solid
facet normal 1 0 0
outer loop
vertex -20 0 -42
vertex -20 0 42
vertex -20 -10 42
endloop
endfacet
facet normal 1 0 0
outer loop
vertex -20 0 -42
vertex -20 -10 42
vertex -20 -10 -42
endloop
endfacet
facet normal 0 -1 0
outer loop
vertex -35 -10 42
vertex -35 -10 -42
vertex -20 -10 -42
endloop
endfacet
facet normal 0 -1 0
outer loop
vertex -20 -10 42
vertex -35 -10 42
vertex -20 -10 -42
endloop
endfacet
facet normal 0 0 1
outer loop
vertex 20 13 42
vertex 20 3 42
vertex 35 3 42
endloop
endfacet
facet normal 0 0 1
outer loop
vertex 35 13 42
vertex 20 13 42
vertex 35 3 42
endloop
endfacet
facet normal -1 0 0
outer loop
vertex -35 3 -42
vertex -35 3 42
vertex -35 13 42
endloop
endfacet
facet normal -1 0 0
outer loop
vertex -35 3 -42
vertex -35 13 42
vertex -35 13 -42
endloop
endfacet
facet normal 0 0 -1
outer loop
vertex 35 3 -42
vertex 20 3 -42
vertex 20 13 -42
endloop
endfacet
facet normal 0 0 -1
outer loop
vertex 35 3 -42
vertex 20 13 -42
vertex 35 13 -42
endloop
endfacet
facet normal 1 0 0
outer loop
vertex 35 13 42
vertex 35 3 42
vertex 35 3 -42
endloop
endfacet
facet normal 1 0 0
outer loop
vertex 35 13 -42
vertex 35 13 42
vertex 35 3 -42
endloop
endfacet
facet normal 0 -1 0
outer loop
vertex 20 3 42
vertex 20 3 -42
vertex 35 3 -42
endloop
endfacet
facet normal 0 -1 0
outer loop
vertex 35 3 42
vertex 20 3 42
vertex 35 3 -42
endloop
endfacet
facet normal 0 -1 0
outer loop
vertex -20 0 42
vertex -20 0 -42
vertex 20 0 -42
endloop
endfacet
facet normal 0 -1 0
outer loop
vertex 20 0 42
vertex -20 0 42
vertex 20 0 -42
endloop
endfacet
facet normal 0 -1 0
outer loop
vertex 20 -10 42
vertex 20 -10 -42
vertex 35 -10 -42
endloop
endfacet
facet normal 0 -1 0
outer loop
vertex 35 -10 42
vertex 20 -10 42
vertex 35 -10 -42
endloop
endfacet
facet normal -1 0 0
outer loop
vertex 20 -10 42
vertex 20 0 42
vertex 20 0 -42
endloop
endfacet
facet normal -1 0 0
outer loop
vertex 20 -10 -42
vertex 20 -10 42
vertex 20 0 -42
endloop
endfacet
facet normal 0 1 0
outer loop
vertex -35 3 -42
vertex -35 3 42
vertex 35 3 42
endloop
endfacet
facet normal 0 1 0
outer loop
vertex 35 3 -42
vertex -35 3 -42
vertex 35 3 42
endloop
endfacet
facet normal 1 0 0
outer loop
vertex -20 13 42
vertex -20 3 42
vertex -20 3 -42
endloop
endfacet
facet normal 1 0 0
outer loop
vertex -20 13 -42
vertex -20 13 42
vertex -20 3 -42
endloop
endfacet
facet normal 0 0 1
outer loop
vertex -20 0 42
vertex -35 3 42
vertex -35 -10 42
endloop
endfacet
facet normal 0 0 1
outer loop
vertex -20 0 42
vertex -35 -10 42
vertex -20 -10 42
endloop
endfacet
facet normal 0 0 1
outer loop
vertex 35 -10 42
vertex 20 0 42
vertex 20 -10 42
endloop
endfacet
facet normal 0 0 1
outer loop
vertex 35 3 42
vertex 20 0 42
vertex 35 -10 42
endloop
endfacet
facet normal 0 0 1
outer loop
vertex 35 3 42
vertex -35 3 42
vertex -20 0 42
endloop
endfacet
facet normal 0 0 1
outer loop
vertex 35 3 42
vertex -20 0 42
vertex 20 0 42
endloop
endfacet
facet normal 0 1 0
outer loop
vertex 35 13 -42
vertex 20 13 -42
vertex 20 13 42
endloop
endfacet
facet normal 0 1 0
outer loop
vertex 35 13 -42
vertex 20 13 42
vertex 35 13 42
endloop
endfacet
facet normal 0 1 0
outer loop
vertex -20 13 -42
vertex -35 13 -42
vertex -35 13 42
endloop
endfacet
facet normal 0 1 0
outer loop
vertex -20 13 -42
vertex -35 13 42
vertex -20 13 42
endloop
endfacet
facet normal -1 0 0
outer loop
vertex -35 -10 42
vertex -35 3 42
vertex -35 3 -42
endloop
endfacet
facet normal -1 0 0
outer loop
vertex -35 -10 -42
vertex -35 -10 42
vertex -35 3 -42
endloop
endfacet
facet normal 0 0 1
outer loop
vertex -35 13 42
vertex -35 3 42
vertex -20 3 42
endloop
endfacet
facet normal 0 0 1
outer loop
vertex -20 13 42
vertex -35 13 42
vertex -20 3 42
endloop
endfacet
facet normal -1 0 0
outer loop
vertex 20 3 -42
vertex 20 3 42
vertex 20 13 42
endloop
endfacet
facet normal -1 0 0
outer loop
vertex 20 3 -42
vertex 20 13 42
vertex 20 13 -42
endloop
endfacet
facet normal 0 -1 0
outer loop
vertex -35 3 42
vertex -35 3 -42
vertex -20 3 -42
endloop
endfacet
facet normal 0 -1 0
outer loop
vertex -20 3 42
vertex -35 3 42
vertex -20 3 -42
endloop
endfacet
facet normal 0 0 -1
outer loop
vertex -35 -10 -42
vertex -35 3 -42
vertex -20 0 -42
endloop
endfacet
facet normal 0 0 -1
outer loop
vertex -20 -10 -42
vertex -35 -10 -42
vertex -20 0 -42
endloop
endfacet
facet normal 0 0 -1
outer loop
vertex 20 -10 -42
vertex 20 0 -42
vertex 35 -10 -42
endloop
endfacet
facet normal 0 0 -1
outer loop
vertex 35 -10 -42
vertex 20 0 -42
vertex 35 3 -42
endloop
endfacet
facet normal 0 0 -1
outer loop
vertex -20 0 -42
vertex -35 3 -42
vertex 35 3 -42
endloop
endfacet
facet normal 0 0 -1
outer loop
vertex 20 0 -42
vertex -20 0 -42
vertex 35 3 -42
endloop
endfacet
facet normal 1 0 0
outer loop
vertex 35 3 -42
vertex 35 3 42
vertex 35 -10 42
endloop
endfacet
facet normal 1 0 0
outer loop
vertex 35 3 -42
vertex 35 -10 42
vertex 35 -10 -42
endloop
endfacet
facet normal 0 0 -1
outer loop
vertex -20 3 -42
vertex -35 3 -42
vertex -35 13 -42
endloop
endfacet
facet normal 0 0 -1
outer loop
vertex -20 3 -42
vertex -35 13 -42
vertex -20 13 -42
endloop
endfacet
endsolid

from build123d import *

# Parameters (mm, degrees)
SKETCH1_W             = 70
SKETCH1_H             = 84
BOSS_EXTRUDE1_DEPTH   = 3
SKETCH2_W             = 15
SKETCH2_H             = 84
BOSS_EXTRUDE2_DEPTH   = 10
BOSS_EXTRUDE2_2_DEPTH = 10


with BuildPart() as part:
    # Sketch1 → Boss-Extrude1 (new body)
    with BuildSketch(Plane(origin=(0, 0, 0), x_dir=(1, 0, 0), z_dir=(0, 1, 0))):
        Rectangle(SKETCH1_W, SKETCH1_H)
    extrude(amount=BOSS_EXTRUDE1_DEPTH)


with BuildPart() as body_2:
    # Sketch2 → Boss-Extrude2 (new body)
    with BuildSketch(Plane(origin=(0, 3, 0), x_dir=(1, 0, 0), z_dir=(0, 1, 0))):
        with Locations((-27.5, 0)):
            Rectangle(SKETCH2_W, SKETCH2_H)
    boss_extrude2 = extrude(amount=BOSS_EXTRUDE2_DEPTH)


with BuildPart() as body_3:
    # Sketch2 → Boss-Extrude2 2 (new body)
    with BuildSketch(Plane(origin=(0, 3, 0), x_dir=(1, 0, 0), z_dir=(0, 1, 0))):
        with Locations((27.5, 0)):
            Rectangle(SKETCH2_W, SKETCH2_H)
    boss_extrude2_2 = extrude(amount=BOSS_EXTRUDE2_2_DEPTH)


with BuildPart() as part_1:
    add(part.part)

    # Mirror3: Boss-Extrude2, Boss-Extrude2 2 across plane
    add(boss_extrude2.mirror(Plane(origin=(0, 1.5, 0), x_dir=(0, 0, 1), z_dir=(0, -1, 0))))
    add(boss_extrude2_2.mirror(Plane(origin=(0, 1.5, 0), x_dir=(0, 0, 1), z_dir=(0, -1, 0))))


solid = Compound([body_2.part, body_3.part, part_1.part])
